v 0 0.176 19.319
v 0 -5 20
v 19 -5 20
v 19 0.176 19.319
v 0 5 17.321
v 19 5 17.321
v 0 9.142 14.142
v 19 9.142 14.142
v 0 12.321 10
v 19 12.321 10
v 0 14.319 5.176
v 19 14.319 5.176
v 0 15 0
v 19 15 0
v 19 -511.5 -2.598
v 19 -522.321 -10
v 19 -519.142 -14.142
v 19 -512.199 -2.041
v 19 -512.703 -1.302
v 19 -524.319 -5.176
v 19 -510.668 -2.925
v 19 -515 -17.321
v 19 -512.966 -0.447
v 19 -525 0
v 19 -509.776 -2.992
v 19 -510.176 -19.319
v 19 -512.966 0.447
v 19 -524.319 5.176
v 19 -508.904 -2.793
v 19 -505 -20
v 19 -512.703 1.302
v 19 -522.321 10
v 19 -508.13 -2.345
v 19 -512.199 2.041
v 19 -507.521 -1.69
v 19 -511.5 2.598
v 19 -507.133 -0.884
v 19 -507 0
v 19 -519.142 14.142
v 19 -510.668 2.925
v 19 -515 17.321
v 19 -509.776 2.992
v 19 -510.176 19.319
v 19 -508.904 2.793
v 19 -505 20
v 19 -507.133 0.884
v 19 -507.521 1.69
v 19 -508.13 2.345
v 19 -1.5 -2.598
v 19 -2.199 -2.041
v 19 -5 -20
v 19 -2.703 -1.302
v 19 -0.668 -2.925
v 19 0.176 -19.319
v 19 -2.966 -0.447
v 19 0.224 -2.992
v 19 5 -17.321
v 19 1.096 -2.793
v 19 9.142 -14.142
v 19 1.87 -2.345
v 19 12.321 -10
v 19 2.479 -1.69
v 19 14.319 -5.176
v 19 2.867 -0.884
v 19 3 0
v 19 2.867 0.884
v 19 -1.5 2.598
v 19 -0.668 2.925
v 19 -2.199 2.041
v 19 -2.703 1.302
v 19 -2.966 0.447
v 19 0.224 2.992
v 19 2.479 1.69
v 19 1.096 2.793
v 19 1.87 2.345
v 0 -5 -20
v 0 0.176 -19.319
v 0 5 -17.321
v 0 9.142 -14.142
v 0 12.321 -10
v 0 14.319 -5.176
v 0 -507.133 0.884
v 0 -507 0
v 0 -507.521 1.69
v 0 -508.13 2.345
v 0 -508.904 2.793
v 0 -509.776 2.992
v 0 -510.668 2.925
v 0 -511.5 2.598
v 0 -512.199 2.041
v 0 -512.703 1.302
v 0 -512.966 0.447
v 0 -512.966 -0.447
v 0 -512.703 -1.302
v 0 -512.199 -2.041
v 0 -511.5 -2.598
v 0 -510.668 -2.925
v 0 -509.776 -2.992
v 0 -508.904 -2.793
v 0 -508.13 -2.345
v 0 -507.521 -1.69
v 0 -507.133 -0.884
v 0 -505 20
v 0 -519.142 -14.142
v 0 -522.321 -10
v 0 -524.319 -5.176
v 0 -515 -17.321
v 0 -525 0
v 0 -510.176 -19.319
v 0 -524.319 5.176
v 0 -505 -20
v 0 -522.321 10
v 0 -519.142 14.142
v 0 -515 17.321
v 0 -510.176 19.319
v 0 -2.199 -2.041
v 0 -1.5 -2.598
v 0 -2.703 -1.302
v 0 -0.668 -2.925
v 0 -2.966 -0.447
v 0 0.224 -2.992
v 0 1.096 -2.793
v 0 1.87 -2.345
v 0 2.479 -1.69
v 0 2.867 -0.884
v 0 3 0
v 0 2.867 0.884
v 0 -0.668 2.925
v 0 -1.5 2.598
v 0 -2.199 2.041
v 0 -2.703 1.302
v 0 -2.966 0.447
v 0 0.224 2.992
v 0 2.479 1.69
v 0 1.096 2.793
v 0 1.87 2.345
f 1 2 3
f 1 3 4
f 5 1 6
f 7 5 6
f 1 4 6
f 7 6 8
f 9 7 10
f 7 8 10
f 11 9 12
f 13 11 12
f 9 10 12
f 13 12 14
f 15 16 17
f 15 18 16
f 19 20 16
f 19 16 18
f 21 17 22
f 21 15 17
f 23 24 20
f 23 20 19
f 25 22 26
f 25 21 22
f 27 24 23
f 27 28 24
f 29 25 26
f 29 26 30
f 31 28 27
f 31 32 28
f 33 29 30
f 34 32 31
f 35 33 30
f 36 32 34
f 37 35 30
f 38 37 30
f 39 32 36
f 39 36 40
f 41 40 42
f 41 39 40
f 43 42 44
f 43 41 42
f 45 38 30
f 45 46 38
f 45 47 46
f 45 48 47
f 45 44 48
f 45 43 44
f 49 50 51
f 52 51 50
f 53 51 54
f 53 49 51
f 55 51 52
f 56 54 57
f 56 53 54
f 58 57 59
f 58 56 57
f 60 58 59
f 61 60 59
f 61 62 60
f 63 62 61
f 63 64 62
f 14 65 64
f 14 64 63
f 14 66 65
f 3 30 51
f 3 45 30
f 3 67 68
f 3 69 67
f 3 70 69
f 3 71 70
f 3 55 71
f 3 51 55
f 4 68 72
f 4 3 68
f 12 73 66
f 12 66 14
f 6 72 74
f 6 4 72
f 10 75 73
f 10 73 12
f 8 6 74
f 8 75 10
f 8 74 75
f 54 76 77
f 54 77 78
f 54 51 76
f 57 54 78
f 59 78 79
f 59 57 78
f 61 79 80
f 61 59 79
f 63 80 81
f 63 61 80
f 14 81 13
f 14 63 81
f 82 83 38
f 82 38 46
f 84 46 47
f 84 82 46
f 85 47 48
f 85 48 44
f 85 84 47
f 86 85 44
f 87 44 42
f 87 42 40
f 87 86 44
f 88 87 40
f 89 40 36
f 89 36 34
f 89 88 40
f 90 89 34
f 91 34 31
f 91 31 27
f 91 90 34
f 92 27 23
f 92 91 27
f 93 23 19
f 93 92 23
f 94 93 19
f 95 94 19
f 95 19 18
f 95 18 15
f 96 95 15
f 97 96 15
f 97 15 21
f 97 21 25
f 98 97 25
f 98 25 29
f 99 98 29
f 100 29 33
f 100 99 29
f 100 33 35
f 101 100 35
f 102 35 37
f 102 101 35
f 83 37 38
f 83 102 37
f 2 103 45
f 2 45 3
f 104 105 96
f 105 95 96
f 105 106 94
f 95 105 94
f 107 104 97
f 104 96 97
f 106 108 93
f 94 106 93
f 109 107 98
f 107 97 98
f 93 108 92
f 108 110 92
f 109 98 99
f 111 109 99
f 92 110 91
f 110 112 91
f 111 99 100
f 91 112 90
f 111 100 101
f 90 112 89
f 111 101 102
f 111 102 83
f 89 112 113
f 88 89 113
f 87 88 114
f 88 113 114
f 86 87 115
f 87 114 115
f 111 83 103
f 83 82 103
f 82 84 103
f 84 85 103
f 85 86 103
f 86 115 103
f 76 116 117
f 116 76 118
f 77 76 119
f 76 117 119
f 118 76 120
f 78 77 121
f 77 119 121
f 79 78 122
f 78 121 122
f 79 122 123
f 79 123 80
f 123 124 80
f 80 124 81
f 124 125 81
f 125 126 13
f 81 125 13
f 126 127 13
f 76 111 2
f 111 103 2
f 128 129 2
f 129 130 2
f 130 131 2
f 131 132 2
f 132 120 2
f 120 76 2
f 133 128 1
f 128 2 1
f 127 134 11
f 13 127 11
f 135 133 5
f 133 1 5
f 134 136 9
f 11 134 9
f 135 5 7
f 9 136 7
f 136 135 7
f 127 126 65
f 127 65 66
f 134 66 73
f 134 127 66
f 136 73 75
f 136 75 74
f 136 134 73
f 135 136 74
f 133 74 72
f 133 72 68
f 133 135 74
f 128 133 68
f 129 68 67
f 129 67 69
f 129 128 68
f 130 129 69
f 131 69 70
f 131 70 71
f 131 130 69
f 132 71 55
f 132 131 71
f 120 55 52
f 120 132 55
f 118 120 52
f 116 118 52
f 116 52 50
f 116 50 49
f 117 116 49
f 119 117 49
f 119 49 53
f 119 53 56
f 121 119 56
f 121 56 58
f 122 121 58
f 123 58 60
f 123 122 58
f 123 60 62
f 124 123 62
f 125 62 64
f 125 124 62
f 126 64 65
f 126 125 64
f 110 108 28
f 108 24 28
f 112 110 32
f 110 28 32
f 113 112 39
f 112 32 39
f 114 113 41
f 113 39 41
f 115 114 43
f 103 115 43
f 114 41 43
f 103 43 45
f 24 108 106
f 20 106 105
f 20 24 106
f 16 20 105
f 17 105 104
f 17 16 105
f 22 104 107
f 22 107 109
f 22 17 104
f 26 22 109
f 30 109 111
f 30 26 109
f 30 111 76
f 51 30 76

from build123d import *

# Parameters (mm, degrees)
F0_W     = 540
F0_H     = 40
F0_R     = 3
F1_DEPTH = 19
F2_R     = 19.99999


# Not quite as in the source:
# - a fillet or chamfer is up to 0.001 mm smaller than in the source, because OpenCascade refuses the exact size


with BuildPart() as f1:
    # F0 (on Right) → F1 (new body)
    with BuildSketch(Plane.YZ):
        with Locations((-255, 0)):
            Rectangle(F0_W, F0_H)
        with Locations((-510, 0)):
            Circle(F0_R, mode=Mode.SUBTRACT)
        Circle(F0_R, mode=Mode.SUBTRACT)
    extrude(amount=F1_DEPTH)

    # F2 (radius 20 in the source; OpenCascade refuses exactly that, so slightly less here)
    f2_edges = [f1.edges().sort_by_distance(p)[0] for p in [
        (9.5, 15, 20),
        (9.5, 15, -20),
        (9.5, -525, 20),
        (9.5, -525, -20),
    ]]
    fillet(f2_edges, radius=F2_R)


solid = f1.part
